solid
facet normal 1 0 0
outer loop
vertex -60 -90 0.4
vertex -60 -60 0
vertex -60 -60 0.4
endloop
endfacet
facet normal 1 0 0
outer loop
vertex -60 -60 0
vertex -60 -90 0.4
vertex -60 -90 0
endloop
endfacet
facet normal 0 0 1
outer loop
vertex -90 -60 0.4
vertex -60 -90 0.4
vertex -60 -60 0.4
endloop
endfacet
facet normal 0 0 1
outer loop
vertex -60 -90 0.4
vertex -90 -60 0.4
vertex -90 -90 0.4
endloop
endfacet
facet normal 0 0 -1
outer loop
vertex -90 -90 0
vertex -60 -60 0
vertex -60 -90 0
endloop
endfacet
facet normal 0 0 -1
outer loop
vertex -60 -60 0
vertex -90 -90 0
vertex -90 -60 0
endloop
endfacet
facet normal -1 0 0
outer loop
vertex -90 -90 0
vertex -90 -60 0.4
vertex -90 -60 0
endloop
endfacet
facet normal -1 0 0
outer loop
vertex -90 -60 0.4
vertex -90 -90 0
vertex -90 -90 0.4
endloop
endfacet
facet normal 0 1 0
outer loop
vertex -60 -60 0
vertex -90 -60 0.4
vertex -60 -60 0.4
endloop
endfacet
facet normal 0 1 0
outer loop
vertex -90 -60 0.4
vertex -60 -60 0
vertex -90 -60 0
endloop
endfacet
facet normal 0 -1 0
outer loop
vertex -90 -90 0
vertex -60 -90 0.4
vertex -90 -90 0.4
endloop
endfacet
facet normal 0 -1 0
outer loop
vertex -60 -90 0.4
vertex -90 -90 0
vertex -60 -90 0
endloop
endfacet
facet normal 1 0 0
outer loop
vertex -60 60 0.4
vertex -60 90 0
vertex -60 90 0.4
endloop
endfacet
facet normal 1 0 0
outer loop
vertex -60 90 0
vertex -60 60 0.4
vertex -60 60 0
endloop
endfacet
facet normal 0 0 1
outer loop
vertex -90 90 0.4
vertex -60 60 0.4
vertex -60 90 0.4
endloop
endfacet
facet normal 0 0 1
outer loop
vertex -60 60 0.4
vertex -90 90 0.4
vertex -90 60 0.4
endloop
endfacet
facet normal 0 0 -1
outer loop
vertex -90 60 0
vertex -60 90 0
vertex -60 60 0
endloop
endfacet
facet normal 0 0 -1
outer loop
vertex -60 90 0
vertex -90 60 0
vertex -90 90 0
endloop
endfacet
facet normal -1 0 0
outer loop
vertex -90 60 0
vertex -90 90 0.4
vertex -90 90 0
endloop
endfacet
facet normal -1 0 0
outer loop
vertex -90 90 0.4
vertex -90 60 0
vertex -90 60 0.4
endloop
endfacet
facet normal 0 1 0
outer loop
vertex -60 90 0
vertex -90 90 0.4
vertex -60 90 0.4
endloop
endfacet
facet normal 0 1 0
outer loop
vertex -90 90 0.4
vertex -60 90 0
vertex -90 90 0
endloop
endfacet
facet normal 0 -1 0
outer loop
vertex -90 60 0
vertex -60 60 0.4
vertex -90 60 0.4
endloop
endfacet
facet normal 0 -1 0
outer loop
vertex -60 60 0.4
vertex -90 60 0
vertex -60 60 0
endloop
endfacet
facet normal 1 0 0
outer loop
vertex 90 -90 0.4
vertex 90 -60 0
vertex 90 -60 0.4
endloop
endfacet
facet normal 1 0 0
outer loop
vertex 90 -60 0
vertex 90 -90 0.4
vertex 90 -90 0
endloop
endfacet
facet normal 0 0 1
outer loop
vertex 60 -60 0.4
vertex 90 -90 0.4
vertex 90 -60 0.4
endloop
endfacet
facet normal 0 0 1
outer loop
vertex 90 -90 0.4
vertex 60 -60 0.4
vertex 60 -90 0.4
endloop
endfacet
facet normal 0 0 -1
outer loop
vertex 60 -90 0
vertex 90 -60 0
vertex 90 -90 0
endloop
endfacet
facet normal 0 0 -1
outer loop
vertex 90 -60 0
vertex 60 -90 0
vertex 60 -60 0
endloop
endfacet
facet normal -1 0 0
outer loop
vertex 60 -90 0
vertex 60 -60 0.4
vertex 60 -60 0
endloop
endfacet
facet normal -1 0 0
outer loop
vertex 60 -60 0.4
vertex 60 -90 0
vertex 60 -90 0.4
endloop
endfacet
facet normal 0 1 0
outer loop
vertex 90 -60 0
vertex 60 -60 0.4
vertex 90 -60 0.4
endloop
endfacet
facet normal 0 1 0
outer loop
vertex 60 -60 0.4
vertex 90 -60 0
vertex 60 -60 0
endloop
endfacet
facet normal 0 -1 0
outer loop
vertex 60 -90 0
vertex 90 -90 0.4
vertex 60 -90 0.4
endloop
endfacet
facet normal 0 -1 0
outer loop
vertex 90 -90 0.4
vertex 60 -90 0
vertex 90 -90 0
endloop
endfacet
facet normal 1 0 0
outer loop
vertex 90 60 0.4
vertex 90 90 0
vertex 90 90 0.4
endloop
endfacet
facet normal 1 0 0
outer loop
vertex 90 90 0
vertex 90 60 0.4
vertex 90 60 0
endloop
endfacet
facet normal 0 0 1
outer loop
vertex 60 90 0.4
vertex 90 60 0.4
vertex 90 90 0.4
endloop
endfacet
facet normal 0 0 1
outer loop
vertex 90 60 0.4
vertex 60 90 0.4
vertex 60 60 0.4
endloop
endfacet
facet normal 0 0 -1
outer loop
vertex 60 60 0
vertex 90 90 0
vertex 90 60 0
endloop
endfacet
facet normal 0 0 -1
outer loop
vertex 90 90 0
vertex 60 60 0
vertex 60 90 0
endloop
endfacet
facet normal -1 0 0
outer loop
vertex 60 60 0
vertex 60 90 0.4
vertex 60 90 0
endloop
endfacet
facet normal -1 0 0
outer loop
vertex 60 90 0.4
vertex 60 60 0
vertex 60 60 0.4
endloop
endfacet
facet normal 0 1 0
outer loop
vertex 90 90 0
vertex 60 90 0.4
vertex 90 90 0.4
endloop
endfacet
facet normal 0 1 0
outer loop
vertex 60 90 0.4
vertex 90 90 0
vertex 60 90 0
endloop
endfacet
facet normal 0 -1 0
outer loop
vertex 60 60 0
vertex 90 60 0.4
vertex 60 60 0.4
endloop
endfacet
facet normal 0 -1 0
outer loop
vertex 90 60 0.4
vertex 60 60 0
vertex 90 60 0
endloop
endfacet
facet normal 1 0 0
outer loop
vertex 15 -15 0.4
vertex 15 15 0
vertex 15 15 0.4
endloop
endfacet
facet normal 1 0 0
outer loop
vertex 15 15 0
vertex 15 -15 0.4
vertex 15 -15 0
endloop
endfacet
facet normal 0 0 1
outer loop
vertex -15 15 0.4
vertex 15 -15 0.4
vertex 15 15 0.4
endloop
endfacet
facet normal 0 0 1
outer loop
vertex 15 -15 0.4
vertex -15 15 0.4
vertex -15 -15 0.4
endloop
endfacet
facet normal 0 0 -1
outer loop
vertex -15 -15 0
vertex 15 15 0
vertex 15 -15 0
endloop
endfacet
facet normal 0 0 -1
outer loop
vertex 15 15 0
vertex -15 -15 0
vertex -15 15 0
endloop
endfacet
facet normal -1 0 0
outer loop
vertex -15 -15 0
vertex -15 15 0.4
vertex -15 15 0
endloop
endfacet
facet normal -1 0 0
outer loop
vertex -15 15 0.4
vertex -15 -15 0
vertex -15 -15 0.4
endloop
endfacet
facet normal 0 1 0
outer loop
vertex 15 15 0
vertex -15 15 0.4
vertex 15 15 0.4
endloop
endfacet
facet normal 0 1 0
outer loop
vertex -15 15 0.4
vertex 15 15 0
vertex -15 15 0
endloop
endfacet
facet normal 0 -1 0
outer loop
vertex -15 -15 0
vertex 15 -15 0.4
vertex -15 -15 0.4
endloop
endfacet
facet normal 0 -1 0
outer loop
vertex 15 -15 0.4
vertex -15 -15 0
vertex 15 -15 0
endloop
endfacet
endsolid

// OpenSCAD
// Set constants as you like
width = 30;
depth = 30;
layer_height = 0.2;
first_layer_height = 0.2;
nr_of_layers = 2;
box_size = 180;

// Calculated parameters
height = first_layer_height + (nr_of_layers - 1) * layer_height;

// Draw the object
translate([-width/2, -depth/2,0]){
  cube(size = [width, depth, height], center = false);
  for (x=[-1:2:1]){
    for (y=[-1:2:1]){
      translate([x * (box_size-width)/2, y * (box_size-depth)/2, 0])
        cube(size = [width, depth, height], center = false);
    } 
  } 
}

// E.g. draw an enclosing box to make it fancy
//nozzle_width = 0.4;
//nr_of_lines = 2;
//tol = 0.1; // used for rendering
//translate([0,0,height/2]){
//  difference(){
//    cube(size = [box_size, box_size, height], center = true);
//    cube(size = [box_size-(2*(nozzle_width*nr_of_lines)), box_size-(2*(nozzle_width*nr_of_lines)), height + tol], center = true);
//  }
//}
